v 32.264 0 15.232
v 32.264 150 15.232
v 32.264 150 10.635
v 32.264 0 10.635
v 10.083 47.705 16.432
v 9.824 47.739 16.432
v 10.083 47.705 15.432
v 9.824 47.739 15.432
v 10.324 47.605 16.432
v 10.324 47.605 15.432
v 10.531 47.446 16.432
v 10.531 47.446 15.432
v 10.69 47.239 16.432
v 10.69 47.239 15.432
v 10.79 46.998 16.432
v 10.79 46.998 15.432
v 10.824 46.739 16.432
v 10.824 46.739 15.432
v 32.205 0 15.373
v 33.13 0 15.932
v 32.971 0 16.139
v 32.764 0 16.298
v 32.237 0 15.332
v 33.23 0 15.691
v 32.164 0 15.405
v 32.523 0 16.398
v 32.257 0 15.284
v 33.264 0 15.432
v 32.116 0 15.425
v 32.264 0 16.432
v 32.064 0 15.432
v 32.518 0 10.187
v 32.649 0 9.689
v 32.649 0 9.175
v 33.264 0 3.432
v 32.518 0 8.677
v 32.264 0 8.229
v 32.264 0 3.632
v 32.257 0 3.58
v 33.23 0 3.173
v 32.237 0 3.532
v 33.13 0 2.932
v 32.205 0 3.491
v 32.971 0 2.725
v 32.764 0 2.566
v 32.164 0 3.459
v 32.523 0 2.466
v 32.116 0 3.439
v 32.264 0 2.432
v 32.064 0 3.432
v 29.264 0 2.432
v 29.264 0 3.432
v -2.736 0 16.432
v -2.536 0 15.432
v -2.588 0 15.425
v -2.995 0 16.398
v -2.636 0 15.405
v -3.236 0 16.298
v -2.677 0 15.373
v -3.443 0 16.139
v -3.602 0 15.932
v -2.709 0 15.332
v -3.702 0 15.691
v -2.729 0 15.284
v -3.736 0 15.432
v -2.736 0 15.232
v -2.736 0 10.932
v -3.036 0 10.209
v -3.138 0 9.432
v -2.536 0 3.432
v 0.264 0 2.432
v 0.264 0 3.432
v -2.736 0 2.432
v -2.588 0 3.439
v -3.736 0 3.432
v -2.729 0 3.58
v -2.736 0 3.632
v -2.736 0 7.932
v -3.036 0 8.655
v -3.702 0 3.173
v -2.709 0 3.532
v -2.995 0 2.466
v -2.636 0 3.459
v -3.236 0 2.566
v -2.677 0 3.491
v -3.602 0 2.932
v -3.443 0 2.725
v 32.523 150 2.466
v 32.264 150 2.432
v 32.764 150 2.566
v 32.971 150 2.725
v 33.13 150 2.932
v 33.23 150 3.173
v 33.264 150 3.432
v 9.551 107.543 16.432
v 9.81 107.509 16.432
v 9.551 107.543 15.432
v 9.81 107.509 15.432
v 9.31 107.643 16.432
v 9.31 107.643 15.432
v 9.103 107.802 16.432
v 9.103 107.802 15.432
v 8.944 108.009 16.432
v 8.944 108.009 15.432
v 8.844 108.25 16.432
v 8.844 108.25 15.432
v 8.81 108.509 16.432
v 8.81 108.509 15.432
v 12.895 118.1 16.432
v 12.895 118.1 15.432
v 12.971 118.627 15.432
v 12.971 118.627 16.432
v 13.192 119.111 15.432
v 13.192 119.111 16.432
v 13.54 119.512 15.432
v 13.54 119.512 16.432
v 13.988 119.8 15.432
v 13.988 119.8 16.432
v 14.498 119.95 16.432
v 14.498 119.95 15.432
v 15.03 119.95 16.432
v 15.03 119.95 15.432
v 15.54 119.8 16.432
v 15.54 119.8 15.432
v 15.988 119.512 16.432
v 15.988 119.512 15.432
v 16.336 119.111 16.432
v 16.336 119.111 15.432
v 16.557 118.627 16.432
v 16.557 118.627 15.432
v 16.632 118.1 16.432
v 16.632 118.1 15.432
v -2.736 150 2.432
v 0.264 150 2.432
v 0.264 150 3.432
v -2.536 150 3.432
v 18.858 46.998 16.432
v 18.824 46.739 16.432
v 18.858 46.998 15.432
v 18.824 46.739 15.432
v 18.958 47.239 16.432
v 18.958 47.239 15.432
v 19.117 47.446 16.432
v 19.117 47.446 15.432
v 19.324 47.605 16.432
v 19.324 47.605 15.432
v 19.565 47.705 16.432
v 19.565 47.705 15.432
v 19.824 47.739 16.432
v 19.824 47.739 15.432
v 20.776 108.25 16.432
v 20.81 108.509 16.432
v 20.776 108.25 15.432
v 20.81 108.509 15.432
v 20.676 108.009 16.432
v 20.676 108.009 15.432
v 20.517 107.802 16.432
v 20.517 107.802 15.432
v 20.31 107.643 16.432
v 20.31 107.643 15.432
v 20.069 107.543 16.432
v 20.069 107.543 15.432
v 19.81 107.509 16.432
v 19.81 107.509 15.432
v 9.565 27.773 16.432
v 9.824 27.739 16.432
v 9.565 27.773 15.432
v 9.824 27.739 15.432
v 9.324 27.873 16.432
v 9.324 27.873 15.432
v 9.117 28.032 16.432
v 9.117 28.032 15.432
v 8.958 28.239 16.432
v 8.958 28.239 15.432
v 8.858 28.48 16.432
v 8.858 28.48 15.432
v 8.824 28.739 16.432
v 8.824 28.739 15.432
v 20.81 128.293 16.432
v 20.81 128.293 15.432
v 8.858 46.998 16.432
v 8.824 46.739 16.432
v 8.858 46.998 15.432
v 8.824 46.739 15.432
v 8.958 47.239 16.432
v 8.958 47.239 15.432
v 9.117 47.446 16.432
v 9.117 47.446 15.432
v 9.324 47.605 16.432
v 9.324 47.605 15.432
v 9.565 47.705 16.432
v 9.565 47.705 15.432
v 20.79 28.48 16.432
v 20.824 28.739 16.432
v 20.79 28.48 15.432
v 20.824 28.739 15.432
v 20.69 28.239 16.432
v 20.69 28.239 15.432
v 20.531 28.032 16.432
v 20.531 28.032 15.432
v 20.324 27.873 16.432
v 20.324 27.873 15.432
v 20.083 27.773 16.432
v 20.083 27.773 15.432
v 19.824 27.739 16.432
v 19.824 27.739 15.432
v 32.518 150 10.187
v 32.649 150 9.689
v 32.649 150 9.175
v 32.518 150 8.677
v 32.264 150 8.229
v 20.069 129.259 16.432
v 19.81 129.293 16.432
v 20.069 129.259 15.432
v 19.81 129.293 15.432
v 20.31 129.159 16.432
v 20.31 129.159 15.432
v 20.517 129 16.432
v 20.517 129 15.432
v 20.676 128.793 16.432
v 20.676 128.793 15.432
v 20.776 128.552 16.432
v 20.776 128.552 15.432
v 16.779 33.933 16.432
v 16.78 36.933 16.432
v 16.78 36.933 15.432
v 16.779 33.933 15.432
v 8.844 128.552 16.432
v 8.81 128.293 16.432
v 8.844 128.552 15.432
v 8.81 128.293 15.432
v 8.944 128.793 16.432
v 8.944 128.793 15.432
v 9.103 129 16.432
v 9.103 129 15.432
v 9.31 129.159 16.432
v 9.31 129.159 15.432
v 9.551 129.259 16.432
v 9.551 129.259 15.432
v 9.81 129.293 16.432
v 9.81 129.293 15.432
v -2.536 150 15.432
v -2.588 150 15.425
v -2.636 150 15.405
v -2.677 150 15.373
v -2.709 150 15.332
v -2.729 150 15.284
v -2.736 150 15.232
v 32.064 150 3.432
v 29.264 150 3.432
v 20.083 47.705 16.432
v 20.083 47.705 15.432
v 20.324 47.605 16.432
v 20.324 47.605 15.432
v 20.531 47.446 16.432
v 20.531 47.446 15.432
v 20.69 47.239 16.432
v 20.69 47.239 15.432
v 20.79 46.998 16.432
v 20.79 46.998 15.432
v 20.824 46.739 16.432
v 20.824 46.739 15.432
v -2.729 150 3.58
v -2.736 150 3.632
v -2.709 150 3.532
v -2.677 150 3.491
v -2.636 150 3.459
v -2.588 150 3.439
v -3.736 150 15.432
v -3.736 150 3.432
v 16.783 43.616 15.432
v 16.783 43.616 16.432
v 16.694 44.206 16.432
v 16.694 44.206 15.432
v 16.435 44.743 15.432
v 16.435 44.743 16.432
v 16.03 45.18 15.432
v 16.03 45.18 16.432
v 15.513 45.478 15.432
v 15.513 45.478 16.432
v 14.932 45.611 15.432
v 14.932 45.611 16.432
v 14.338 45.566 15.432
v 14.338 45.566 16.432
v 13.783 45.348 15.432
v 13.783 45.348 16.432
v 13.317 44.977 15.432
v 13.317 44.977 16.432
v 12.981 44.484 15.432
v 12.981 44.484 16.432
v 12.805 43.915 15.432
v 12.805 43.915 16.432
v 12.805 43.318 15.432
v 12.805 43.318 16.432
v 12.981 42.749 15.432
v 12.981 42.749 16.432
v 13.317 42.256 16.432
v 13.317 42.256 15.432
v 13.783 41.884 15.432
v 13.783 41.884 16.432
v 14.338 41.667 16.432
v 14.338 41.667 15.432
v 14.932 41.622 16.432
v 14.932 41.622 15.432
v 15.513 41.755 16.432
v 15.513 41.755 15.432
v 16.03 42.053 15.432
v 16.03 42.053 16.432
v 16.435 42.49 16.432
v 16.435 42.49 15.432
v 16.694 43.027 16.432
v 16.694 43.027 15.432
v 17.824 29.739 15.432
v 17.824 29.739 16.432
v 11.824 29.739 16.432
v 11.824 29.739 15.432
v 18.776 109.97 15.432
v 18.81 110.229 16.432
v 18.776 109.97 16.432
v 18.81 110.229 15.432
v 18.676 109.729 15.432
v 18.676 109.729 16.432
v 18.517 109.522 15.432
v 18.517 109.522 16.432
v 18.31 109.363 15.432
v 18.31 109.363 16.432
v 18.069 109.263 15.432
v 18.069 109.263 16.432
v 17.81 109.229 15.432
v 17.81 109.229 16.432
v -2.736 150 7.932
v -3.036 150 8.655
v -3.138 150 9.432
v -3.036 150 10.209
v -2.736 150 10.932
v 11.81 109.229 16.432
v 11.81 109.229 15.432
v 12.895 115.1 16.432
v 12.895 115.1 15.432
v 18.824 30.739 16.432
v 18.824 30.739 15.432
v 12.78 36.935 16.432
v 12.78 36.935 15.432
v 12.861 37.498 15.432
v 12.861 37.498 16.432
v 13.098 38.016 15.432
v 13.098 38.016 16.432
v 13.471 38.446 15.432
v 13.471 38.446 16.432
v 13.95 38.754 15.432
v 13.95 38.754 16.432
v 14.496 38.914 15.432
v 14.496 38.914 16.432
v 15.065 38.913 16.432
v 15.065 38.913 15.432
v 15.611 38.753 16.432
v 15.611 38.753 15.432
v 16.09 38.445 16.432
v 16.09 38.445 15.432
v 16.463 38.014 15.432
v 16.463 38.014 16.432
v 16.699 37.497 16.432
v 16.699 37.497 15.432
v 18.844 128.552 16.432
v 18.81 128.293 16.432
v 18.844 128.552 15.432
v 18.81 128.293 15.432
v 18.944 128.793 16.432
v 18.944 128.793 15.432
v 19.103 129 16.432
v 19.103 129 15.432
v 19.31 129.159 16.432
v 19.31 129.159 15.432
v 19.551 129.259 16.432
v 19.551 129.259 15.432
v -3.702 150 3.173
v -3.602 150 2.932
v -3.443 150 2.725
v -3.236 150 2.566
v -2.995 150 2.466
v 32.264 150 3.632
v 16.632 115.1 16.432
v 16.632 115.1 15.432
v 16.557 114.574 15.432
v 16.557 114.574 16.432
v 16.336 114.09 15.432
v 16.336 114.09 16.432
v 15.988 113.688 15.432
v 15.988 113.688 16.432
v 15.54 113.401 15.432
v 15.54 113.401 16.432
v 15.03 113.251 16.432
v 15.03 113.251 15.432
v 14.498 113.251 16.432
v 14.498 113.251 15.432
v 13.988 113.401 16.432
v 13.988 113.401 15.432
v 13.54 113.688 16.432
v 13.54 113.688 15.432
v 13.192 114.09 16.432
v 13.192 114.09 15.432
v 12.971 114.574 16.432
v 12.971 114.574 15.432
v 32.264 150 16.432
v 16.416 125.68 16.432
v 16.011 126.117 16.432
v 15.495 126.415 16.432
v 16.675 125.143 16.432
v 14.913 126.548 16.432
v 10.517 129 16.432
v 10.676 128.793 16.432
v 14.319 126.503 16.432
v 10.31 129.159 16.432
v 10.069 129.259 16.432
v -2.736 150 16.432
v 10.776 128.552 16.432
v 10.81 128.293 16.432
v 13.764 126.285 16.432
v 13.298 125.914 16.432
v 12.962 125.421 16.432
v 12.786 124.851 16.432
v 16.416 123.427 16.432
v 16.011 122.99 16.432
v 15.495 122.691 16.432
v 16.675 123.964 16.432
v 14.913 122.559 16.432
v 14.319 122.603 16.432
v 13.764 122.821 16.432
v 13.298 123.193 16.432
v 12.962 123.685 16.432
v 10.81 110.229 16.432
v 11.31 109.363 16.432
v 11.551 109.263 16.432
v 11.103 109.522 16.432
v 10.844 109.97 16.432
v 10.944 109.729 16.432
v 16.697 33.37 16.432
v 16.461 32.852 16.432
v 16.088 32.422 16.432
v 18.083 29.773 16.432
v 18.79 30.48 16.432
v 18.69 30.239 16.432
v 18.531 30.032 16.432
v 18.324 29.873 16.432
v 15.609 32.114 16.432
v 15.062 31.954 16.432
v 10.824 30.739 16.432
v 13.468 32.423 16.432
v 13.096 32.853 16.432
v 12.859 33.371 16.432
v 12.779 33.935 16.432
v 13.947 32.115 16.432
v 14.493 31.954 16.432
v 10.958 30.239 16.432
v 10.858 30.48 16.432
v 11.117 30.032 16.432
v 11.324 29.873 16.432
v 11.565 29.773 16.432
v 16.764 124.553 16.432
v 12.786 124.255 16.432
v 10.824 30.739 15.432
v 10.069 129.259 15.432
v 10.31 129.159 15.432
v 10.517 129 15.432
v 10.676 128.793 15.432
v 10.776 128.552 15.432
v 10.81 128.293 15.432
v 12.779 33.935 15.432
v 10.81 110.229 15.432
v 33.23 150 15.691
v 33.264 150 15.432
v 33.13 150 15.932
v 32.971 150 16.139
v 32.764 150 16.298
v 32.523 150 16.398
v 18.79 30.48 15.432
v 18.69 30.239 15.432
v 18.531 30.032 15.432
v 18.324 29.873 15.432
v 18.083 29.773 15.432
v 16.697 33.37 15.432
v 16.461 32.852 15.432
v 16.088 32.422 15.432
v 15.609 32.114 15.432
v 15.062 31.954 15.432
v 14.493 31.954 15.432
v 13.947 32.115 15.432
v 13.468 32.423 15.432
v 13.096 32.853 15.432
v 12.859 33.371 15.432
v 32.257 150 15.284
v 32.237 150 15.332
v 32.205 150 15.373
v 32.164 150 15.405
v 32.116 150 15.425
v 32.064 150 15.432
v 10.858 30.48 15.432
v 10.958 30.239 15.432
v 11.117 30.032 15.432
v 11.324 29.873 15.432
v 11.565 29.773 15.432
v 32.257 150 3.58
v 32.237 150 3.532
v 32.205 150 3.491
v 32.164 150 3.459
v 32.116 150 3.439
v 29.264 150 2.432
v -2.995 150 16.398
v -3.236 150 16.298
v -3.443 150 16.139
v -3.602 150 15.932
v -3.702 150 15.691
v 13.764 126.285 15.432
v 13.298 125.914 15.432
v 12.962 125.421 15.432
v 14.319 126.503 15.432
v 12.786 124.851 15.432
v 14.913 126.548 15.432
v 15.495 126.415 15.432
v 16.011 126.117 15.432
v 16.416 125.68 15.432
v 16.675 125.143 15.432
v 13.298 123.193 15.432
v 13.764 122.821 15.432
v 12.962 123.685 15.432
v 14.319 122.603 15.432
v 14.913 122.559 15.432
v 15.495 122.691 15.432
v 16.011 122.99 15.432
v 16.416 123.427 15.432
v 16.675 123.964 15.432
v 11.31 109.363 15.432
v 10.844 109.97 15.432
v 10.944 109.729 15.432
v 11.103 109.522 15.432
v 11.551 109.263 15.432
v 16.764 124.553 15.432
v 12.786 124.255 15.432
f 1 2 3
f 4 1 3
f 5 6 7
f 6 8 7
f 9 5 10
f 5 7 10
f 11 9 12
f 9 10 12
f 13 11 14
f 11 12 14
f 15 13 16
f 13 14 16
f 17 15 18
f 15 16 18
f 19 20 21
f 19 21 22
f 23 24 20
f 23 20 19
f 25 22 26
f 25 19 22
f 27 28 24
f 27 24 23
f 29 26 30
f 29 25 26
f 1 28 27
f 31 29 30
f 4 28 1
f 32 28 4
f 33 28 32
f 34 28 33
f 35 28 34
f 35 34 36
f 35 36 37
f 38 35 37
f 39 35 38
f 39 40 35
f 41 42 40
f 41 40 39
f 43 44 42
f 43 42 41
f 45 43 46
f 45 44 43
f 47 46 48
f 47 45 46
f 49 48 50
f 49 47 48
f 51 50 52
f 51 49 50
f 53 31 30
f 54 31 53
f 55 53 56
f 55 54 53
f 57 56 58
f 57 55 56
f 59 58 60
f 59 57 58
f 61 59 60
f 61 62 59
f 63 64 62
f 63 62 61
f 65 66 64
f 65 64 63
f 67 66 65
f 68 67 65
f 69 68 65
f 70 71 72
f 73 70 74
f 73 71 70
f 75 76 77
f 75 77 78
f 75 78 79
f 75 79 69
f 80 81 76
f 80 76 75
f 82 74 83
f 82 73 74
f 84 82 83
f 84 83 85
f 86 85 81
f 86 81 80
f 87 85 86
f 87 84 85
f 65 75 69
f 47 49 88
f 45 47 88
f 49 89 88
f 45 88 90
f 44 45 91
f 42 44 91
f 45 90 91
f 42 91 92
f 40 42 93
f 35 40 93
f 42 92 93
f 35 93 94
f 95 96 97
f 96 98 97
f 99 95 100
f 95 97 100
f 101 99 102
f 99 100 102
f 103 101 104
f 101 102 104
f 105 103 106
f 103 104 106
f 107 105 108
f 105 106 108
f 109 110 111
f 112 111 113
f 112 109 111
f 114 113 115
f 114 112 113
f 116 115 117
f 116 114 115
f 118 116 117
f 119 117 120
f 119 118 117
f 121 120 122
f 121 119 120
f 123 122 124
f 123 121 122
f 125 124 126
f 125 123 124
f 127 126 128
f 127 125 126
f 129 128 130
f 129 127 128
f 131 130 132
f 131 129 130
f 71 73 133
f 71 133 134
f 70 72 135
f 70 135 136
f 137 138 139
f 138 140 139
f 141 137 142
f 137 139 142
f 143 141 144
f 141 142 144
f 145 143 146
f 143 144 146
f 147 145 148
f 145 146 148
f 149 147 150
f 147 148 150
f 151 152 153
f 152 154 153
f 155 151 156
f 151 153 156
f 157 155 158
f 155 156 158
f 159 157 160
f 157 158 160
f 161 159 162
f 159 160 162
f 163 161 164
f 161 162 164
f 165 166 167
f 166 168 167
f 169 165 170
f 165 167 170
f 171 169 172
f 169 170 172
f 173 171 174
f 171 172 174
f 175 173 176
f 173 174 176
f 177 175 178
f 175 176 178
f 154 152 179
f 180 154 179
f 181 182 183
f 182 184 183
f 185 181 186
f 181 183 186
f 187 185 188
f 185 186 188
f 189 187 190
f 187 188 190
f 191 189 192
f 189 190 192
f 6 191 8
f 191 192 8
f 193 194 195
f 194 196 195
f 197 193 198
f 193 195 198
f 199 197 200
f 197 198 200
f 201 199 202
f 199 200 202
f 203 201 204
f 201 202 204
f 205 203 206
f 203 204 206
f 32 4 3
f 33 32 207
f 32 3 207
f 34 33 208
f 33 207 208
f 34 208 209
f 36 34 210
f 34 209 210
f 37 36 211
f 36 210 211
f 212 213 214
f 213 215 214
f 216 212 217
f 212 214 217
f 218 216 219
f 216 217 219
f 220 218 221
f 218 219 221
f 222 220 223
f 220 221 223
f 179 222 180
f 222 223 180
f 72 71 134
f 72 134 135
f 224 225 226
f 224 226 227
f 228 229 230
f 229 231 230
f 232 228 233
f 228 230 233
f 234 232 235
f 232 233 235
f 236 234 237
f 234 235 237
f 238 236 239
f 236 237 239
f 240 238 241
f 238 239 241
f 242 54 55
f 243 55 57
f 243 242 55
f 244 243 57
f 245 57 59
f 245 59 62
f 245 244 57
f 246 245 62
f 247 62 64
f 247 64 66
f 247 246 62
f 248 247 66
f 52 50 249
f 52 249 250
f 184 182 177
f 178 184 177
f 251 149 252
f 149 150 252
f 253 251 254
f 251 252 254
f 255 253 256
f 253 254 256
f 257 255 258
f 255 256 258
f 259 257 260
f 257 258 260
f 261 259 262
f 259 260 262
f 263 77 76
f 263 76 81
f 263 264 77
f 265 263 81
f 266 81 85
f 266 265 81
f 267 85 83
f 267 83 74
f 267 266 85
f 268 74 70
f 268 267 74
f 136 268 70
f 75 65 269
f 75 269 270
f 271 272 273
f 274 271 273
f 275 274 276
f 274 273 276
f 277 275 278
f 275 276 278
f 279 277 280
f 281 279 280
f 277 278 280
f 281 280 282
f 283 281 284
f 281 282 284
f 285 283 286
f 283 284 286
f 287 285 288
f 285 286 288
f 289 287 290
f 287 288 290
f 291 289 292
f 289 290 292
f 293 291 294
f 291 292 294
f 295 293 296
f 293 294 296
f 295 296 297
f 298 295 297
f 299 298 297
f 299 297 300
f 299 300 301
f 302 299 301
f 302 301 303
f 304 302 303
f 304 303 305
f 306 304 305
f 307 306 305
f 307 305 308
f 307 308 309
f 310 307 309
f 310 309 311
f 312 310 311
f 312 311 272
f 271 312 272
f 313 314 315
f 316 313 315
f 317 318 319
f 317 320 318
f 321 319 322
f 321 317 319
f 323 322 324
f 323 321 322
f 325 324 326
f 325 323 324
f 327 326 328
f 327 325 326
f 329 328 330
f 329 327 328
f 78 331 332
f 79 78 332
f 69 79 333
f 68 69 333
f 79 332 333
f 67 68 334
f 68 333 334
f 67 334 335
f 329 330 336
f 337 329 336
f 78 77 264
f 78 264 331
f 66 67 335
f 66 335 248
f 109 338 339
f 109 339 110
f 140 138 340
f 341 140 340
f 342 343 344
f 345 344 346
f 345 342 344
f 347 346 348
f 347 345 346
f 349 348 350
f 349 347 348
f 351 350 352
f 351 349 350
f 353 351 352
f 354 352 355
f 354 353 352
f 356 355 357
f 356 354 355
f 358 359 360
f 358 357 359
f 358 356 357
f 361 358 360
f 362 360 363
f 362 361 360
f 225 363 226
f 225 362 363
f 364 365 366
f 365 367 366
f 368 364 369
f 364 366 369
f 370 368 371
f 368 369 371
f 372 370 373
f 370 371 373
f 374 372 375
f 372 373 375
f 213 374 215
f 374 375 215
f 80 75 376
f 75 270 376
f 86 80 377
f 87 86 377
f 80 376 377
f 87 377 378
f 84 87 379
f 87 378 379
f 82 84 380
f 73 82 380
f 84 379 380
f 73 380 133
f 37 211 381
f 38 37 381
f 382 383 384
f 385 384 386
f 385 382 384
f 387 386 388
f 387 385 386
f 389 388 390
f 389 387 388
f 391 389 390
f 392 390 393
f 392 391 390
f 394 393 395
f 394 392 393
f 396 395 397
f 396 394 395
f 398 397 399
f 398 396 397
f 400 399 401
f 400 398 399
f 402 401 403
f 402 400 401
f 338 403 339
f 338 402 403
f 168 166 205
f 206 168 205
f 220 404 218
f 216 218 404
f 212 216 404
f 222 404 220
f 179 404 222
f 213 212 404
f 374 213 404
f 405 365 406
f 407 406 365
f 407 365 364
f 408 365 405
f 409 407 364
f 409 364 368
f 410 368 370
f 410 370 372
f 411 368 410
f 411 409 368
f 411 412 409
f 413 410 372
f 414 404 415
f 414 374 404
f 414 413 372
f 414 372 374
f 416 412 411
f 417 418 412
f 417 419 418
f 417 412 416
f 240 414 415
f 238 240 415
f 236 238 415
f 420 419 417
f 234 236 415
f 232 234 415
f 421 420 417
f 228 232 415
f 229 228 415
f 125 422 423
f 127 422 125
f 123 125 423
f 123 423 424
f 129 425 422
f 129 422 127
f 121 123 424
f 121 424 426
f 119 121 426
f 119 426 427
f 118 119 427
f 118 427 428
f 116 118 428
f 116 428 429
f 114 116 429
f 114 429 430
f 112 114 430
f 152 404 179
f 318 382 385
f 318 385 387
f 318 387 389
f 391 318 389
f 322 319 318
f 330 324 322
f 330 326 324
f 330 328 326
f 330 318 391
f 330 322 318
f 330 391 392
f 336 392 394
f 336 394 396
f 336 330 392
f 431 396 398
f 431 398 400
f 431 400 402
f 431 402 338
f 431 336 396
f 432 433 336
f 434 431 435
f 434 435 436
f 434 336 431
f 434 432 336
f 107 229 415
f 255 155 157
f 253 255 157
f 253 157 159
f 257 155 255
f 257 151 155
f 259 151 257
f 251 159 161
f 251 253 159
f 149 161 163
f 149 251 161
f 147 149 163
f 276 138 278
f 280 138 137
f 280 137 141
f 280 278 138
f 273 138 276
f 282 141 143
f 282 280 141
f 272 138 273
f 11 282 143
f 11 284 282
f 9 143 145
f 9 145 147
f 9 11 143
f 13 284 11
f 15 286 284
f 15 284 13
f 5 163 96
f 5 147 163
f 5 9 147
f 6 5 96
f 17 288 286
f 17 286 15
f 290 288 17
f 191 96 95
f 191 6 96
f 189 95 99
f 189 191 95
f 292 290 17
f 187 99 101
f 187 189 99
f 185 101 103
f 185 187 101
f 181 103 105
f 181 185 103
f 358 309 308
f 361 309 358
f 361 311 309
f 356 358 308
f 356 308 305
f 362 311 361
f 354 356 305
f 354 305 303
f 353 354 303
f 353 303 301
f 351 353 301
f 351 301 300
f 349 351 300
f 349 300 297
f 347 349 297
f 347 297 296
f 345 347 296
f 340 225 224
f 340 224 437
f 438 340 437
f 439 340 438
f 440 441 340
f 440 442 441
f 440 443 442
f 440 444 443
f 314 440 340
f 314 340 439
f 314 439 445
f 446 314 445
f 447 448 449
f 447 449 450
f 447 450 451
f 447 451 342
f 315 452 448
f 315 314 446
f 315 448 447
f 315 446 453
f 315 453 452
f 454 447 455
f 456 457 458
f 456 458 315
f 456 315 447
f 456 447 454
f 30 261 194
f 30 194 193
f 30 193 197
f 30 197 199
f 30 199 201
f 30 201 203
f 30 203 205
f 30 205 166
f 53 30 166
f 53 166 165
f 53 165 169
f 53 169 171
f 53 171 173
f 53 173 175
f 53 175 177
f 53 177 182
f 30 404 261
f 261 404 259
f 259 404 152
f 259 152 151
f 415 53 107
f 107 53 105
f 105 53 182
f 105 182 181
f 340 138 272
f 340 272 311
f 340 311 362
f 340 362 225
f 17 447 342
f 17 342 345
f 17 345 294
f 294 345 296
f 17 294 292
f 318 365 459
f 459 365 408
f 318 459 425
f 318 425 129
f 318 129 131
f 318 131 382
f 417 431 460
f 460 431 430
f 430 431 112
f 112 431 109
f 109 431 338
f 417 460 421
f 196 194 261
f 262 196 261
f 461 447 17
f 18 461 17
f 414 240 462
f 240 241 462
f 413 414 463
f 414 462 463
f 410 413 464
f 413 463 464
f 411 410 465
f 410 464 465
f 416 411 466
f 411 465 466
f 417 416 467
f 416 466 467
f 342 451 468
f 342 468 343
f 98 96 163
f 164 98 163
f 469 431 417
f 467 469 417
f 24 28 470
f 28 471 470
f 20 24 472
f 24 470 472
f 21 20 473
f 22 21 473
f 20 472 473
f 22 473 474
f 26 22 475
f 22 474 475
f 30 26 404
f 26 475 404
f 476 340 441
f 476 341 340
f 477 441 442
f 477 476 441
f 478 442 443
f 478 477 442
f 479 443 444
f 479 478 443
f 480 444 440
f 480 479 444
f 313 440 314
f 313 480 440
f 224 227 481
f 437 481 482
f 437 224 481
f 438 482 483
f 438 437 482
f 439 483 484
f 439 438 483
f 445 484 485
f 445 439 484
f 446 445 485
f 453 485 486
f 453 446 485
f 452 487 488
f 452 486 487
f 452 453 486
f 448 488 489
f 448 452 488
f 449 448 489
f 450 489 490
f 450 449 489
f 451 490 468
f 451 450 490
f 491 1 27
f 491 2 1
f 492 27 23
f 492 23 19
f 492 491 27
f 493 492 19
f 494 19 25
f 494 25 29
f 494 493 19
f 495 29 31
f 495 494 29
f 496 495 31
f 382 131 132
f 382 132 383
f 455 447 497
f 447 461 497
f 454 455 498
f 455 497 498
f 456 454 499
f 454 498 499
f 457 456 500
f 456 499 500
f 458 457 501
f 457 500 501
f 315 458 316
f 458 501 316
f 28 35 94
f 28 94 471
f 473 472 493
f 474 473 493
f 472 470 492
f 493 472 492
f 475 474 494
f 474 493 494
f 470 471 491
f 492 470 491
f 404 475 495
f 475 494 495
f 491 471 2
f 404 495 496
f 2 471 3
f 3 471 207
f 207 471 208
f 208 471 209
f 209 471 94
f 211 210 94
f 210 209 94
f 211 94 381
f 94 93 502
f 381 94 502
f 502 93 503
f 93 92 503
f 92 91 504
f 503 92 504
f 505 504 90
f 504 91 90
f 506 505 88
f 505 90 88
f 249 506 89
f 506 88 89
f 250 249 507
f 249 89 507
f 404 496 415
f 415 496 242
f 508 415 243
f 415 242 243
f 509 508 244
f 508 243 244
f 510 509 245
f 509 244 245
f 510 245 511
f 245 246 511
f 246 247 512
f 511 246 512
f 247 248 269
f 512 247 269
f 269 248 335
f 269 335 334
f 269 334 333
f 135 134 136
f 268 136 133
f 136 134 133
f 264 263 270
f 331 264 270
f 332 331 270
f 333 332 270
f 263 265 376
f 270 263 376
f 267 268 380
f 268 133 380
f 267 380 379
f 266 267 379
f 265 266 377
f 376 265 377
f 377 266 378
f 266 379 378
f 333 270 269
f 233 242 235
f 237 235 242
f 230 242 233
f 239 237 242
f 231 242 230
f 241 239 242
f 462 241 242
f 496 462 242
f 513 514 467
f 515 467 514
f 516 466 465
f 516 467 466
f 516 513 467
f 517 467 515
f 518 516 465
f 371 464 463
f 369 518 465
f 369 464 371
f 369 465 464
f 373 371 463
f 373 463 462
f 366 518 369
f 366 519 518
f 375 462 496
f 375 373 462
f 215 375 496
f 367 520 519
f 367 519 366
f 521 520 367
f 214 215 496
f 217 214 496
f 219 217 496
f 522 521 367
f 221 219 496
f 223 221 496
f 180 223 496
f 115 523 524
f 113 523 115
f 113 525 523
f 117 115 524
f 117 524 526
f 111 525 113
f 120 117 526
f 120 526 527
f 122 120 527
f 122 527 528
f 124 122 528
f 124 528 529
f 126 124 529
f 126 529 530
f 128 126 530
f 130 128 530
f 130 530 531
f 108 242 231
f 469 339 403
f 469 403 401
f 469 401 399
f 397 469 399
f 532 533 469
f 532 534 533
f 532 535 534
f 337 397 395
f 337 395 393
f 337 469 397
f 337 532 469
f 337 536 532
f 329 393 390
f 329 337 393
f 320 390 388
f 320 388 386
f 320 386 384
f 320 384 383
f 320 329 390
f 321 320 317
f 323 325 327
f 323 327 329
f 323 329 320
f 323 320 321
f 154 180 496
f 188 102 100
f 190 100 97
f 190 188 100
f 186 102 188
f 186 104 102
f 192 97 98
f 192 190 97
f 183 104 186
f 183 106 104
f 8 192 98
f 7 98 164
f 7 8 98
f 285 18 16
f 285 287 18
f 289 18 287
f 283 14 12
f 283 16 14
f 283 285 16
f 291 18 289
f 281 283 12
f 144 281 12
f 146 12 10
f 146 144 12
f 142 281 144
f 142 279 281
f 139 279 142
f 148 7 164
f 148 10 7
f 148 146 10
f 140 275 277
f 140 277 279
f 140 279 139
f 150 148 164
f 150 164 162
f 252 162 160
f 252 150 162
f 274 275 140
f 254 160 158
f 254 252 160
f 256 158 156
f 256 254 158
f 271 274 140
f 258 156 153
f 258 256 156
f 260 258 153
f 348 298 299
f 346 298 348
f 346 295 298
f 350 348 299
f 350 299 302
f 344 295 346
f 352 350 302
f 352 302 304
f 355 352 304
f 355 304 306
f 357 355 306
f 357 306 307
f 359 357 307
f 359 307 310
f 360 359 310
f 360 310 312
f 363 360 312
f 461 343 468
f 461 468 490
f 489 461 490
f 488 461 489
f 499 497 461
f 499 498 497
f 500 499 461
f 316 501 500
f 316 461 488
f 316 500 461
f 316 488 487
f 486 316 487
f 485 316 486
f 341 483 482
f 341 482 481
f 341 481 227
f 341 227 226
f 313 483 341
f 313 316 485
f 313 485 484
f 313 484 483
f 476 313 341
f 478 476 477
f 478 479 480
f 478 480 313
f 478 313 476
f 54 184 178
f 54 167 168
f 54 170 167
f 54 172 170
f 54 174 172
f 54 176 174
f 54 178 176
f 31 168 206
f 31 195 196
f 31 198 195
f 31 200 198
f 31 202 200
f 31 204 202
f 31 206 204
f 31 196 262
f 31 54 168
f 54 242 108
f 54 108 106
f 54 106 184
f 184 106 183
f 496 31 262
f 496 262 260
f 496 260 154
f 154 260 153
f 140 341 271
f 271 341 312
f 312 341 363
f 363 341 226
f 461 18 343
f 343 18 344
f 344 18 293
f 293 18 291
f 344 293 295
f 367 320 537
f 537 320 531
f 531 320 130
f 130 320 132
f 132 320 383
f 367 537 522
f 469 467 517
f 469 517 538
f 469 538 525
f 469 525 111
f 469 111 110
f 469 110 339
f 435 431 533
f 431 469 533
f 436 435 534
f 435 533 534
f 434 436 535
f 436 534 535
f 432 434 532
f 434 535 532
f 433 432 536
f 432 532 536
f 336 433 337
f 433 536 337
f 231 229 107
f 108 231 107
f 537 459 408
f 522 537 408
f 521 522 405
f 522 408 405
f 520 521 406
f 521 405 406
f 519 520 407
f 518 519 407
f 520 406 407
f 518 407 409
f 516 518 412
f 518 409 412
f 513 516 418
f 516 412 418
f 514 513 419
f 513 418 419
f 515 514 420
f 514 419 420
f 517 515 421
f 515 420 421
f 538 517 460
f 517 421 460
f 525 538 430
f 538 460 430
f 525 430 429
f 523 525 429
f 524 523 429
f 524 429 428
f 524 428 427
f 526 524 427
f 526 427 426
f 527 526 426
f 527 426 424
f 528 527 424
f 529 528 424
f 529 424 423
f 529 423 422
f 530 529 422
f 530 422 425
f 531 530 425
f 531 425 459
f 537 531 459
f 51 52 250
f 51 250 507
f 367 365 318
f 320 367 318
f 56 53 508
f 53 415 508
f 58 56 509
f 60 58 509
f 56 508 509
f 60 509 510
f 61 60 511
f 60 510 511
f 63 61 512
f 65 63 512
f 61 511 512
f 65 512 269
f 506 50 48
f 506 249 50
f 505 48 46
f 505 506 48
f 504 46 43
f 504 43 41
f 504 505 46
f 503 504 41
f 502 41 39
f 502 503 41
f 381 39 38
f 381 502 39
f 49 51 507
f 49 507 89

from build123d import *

# Parameters (mm, degrees)
BOSS_EXTRUDE1_DEPTH = 150
FILLET1_R           = 1
FILLET2_R           = 0.2
SKETCH2_R           = 2
CUT_EXTRUDE1_DEPTH  = 155.280557534
CUT_EXTRUDE2_DEPTH  = 155.280557534
CUT_EXTRUDE3_DEPTH  = 150
FILLET7_R           = 1
SKETCH7_R           = 2
CUT_EXTRUDE4_DEPTH  = 155.280557534
CUT_EXTRUDE6_DEPTH  = 155.280557534
FILLET9_R           = 1
SKETCH12_R          = 2
SKETCH12_R_2        = 3
CUT_EXTRUDE7_DEPTH  = 155.520226026


with BuildPart() as part:
    # Sketch1 → Boss-Extrude1 (new body)
    with BuildSketch(Plane(origin=(0, 0, 0), x_dir=(1, 0, 0), z_dir=(0, 1, 0))):
        Polygon((-2.736049046, -15.431975477), (32.263950954, -15.431975477), (32.263950954, -3.431975477), (29.263950954, -3.431975477), (29.263950954, -2.431975477), (33.263950954, -2.431975477), (33.263950954, -16.431975477), (-3.736049046, -16.431975477), (-3.736049046, -2.431975477), (0.263950954, -2.431975477), (0.263950954, -3.431975477), (-2.736049046, -3.431975477), align=None)
    extrude(amount=BOSS_EXTRUDE1_DEPTH)

    # Fillet1
    fillet1_edges = [part.edges().sort_by_distance(p)[0] for p in [
        (33.263950954, 75, 2.431975477),
        (33.263950954, 75, 16.431975477),
        (-3.736049046, 75, 16.431975477),
        (-3.736049046, 75, 2.431975477),
    ]]
    fillet(fillet1_edges, radius=FILLET1_R)

    # Fillet2
    fillet2_edges = [part.edges().sort_by_distance(p)[0] for p in [
        (-2.736049046, 75, 15.431975477),
        (32.263950954, 75, 15.431975477),
        (32.263950954, 75, 3.431975477),
        (-2.736049046, 75, 3.431975477),
    ]]
    fillet(fillet2_edges, radius=FILLET2_R)

    # Sketch2 → Cut-Extrude1 (cut, through all)
    with BuildSketch(Plane.XY.offset(16.431975477)):
        with Locations((14.763950954, 124.553168405)):
            Circle(SKETCH2_R)
    extrude(amount=-CUT_EXTRUDE1_DEPTH, mode=Mode.SUBTRACT)

    # Sketch4 → Cut-Extrude2 (cut, through all)
    with BuildSketch(Plane.XY.offset(16.431975477)):
        with BuildLine():
            Line((16.632444953, 118.100326697), (16.632444953, 115.100326697))
            ThreePointArc((16.632444953, 115.100326697), (14.763950954, 113.231832698), (12.895456955, 115.100326697))
            Line((12.895456955, 115.100326697), (12.895456955, 118.100326697))
            ThreePointArc((12.895456955, 118.100326697), (14.763950954, 119.968820696), (16.632444953, 118.100326697))
        make_face()
    extrude(amount=-CUT_EXTRUDE2_DEPTH, mode=Mode.SUBTRACT)

    # Sketch6 → Cut-Extrude3 (cut)
    with BuildSketch(Plane.XY.offset(16.431975477)):
        Polygon((18.810239274, 129.292771491), (18.810239274, 109.228960099), (10.810239274, 109.228960099), (10.810239274, 129.292771491), (8.810239274, 129.292771491), (8.810239274, 107.509210665), (20.810239274, 107.509210665), (20.810239274, 129.292771491), align=None)
    extrude(amount=-CUT_EXTRUDE3_DEPTH, mode=Mode.SUBTRACT)

    # Fillet7
    fillet7_edges = [part.edges().sort_by_distance(p)[0] for p in [
        (8.810239274, 107.509210665, 15.931975477),
        (20.810239274, 107.509210665, 15.931975477),
        (18.810239274, 109.228960099, 15.931975477),
        (10.810239274, 109.228960099, 15.931975477),
        (10.810239274, 129.292771491, 15.931975477),
        (8.810239274, 129.292771491, 15.931975477),
        (18.810239274, 129.292771491, 15.931975477),
        (20.810239274, 129.292771491, 15.931975477),
    ]]
    fillet(fillet7_edges, radius=FILLET7_R - 0.0001)  # a hair under: the kernel refuses the full size

    # Sketch7 → Cut-Extrude4 (cut, through all)
    with BuildSketch(Plane.XY.offset(16.431975477)):
        with Locations((14.782730099, 43.616424241)):
            Circle(SKETCH7_R)
        with BuildLine():
            Line((16.779852756, 36.933079114), (16.778561099, 33.933079392))
            ThreePointArc((16.778561099, 33.933079392), (14.77770018, 31.933940682), (12.77856147, 33.9348016))
            Line((12.77856147, 33.9348016), (12.779853126, 36.934801322))
            ThreePointArc((12.779853126, 36.934801322), (14.780714045, 38.933940033), (16.779852756, 36.933079114))
        make_face()
    extrude(amount=-CUT_EXTRUDE4_DEPTH, mode=Mode.SUBTRACT)

    # Sketch9 → Cut-Extrude6 (cut, through all)
    with BuildSketch(Plane.XY.offset(16.431975477)):
        Polygon((18.824358564, 47.739325349), (18.824358564, 29.739325349), (10.824358564, 29.739325349), (10.824358564, 47.739325349), (8.824358564, 47.739325349), (8.824358564, 27.739325349), (20.824358564, 27.739325349), (20.824358564, 47.739325349), align=None)
    extrude(amount=-CUT_EXTRUDE6_DEPTH, mode=Mode.SUBTRACT)

    # Fillet9
    fillet9_edges = [part.edges().sort_by_distance(p)[0] for p in [
        (20.824358564, 27.739325349, 15.931975477),
        (18.824358564, 29.739325349, 15.931975477),
        (8.824358564, 27.739325349, 15.931975477),
        (10.824358564, 29.739325349, 15.931975477),
        (8.824358564, 47.739325349, 15.931975477),
        (10.824358564, 47.739325349, 15.931975477),
        (18.824358564, 47.739325349, 15.931975477),
        (20.824358564, 47.739325349, 15.931975477),
    ]]
    fillet(fillet9_edges, radius=FILLET9_R - 0.0001)  # a hair under: the kernel refuses the full size

    # Sketch12 → Cut-Extrude7 (cut, through all)
    with BuildSketch(Plane(origin=(0, 150, 0), x_dir=(1, 0, 0), z_dir=(0, 1, 0))):
        with Locations((30.665950954, -9.431975477)):
            Circle(SKETCH12_R)
        with Locations((-0.138049046, -9.431975477)):
            Circle(SKETCH12_R_2)
    extrude(amount=-CUT_EXTRUDE7_DEPTH, mode=Mode.SUBTRACT)


solid = part.part
